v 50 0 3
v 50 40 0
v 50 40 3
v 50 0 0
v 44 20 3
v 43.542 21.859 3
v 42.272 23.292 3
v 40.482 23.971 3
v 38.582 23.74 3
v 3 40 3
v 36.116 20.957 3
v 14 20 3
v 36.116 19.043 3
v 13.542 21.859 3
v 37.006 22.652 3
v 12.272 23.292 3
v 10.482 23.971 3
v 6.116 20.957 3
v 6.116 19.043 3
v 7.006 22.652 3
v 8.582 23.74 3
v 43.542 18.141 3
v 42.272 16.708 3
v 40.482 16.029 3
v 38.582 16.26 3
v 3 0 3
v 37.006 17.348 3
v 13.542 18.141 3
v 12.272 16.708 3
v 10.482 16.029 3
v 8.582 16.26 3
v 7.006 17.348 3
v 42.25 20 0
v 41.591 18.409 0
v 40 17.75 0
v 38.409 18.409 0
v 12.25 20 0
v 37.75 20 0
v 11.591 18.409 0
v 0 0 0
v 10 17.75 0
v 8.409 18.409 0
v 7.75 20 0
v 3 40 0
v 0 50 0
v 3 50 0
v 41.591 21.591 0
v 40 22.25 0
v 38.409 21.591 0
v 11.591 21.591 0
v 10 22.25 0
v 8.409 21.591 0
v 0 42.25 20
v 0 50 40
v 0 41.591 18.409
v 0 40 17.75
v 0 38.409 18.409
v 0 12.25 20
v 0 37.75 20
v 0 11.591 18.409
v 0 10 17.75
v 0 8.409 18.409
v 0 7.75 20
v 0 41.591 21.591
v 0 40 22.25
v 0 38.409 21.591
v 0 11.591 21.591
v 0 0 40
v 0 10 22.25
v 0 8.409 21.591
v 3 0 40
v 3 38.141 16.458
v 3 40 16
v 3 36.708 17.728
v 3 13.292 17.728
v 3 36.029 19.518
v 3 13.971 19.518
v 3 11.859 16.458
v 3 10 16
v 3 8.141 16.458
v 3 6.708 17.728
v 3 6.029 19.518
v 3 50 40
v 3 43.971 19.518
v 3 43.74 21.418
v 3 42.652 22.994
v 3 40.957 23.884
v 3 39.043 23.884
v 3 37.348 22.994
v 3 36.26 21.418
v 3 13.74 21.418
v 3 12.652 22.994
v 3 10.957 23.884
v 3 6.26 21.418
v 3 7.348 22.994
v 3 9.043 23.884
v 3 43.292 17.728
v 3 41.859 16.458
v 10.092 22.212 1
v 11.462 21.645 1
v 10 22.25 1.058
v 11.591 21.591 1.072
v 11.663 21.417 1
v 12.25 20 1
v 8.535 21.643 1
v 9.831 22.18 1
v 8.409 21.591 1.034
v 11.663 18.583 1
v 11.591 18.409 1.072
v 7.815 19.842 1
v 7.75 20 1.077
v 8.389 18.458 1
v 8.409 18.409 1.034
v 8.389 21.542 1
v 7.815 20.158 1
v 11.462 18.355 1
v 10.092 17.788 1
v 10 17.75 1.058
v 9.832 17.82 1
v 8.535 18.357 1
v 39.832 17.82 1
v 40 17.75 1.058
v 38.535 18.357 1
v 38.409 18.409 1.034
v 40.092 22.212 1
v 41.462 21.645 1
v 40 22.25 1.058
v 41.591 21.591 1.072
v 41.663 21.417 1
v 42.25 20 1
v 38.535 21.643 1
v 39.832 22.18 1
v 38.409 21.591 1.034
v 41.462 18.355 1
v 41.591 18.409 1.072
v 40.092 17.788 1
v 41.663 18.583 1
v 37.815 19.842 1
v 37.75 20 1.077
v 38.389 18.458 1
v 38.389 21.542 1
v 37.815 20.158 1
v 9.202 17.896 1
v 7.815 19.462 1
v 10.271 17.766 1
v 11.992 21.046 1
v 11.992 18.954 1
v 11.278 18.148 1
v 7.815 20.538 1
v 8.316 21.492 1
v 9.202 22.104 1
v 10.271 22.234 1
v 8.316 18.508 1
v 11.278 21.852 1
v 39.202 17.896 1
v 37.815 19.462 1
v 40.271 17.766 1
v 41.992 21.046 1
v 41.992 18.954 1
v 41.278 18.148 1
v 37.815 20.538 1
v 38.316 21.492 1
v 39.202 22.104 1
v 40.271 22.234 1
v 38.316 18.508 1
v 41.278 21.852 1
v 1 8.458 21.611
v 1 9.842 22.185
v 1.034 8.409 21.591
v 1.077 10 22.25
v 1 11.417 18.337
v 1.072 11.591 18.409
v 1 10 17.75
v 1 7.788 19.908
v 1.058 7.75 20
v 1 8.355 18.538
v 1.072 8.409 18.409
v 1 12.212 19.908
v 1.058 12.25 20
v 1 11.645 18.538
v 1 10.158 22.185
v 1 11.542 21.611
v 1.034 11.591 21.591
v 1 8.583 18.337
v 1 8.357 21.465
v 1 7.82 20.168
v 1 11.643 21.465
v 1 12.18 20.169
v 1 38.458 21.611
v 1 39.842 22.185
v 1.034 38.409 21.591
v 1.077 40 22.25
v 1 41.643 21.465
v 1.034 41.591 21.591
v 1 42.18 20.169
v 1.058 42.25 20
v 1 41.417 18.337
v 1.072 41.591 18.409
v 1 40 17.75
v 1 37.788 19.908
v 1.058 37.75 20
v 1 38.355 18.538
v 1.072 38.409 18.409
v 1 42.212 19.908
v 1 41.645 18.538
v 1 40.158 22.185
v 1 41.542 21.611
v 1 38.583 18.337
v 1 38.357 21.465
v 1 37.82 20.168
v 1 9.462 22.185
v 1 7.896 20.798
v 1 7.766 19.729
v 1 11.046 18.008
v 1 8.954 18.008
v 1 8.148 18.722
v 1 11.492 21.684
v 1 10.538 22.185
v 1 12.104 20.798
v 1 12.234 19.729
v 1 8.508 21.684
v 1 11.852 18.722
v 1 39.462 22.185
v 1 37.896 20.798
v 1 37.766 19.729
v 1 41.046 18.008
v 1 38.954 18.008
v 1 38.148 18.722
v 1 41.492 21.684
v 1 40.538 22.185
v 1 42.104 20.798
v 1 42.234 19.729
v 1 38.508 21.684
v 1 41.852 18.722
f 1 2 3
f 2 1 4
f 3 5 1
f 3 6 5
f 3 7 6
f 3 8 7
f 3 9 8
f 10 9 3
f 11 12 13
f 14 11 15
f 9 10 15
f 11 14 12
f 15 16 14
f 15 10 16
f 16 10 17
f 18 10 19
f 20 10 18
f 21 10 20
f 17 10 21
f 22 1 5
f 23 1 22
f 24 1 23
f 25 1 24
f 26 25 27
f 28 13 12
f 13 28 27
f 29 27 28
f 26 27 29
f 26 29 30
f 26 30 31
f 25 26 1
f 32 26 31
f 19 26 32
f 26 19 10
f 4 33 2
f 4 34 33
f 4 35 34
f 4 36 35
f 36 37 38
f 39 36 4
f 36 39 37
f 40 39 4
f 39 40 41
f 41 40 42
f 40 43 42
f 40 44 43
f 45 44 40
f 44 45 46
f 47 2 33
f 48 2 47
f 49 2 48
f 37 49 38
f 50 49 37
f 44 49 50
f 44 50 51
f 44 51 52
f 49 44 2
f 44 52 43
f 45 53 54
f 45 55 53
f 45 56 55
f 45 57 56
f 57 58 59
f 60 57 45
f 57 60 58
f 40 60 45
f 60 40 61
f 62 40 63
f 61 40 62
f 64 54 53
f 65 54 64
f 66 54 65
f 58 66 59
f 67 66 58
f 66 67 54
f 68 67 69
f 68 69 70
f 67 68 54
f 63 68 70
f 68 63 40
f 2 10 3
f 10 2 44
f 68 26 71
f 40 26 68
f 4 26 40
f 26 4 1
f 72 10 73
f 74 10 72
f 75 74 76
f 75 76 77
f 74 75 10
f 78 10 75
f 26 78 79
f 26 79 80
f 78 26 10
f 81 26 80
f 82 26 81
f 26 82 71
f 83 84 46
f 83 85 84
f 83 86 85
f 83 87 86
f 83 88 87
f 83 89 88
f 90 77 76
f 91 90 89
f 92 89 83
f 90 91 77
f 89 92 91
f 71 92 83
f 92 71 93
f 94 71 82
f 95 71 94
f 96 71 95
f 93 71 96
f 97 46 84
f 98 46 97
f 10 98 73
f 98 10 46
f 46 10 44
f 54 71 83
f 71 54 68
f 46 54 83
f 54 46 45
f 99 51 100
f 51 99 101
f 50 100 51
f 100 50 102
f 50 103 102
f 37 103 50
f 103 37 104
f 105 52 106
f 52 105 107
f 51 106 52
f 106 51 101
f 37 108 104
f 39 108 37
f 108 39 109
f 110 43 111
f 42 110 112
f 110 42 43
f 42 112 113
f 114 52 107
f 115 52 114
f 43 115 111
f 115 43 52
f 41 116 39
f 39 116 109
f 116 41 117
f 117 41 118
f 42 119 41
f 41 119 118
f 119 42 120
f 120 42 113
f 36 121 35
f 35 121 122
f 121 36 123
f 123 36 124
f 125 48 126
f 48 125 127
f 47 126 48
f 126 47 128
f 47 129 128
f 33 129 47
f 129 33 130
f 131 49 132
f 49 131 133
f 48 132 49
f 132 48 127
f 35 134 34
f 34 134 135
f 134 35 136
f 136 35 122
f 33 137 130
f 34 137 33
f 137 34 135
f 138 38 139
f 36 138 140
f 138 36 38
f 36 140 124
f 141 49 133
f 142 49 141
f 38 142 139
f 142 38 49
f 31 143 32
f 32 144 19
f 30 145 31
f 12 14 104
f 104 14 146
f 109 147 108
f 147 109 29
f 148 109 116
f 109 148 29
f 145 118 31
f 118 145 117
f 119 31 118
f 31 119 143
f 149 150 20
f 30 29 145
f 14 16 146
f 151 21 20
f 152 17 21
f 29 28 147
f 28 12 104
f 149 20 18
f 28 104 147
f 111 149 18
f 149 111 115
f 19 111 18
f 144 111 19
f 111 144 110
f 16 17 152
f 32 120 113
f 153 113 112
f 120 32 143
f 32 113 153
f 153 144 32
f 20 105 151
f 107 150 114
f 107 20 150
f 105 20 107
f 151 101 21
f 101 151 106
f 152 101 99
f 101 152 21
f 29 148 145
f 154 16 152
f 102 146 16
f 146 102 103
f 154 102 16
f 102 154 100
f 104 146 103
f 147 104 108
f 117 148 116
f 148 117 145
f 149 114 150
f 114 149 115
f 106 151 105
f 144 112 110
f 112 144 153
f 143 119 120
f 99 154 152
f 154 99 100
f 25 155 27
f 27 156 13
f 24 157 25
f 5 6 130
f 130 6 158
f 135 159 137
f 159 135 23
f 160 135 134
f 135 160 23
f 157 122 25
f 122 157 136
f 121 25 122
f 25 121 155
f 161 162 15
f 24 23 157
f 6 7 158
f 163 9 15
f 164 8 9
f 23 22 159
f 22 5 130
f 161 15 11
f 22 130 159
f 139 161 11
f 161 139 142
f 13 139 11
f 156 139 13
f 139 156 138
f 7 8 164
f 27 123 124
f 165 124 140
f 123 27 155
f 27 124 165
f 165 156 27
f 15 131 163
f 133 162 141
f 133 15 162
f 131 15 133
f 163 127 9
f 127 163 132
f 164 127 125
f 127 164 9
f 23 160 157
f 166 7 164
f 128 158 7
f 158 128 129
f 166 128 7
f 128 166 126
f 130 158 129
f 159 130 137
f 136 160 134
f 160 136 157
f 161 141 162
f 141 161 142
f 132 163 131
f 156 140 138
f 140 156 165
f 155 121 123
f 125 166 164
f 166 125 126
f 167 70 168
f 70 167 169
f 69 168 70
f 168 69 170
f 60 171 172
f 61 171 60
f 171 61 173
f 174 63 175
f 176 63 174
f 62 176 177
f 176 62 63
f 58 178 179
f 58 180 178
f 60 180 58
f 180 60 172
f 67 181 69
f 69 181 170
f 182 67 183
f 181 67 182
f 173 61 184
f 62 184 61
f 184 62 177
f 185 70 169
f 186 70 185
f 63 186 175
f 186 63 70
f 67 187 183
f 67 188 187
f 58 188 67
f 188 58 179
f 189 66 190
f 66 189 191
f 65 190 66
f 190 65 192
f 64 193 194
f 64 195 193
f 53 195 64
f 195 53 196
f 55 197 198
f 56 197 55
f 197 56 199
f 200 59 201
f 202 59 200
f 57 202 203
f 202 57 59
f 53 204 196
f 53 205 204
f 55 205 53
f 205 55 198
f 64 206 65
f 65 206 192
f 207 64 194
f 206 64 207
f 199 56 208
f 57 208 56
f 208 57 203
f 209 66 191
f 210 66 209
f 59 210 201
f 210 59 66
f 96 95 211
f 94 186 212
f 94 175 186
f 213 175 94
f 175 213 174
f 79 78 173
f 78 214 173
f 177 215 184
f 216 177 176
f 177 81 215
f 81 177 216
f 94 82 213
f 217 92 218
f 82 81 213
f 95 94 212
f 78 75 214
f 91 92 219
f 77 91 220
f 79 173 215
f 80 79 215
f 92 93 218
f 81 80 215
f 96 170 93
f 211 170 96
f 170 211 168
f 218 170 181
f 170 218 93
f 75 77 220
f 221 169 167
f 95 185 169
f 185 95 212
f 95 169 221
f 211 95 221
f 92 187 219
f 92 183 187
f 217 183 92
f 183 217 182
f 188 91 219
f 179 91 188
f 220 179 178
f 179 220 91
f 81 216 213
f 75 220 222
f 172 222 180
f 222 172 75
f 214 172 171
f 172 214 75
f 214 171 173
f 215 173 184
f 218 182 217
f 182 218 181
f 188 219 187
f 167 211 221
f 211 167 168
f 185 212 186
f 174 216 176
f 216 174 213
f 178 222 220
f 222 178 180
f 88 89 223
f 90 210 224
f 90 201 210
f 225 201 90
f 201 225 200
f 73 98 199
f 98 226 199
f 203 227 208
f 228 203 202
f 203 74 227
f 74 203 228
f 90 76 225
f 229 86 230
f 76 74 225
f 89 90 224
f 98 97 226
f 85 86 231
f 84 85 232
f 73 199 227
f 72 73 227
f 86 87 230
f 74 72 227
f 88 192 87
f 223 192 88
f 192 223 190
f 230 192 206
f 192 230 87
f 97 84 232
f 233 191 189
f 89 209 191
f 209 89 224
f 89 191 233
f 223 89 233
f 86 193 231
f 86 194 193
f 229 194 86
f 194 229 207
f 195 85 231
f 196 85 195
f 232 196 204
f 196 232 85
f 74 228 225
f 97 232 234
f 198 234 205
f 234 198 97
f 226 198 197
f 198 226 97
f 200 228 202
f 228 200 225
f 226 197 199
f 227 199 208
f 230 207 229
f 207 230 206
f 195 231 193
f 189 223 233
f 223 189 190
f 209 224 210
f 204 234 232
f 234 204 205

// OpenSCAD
// 修正版 OpenSCAD: L字金具 (水平板 XY 平面, 垂直板 YZ 平面)、内側コーナー原点
// 内側コーナーを原点 (0,0,0) に配置
// 水平板: 50 (X) × 40 (Y) × 3 (Z)
// 垂直板: 3 (X) × 50 (Y) × 40 (Z)
// 皿穴は各面に2個ずつ、合計4個 (M4, 貫通穴 Φ4.5, 皿座面 Φ8, 深さ 2)
// 皿座面は外側へ向ける
difference() {
  union() {
    // 水平板: XY 平面, 薄さ 3
    cube([50, 40, 3], center=false);

    // 垂直板: YZ 平面, 薄さ 3 (X方向に厚さ 3)
    cube([3, 50, 40], center=false);
  }

  // 水平板の皿穴2個 (Z軸方向に貫通)
  translate([10, 20, 0])
    cylinder(h=3, r=2.25, center=false); // Φ4.5 貫通穴
  translate([40, 20, 0])
    cylinder(h=3, r=2.25, center=false);

  // 皿座面は外側(上部面 z = 3) に向ける
  translate([10, 20, 1])
    cylinder(h=2, r1=2.25, r2=4, center=false); // 皿座面 Φ8 深さ 2
  translate([40, 20, 1])
    cylinder(h=2, r1=2.25, r2=4, center=false);

  // 垂直板の皿穴2個 (X軸方向に貫通)
  // 中心点: 貫通方向は X、中心は X = 0 から厚さ 3 の範囲を貫通
  translate([0, 10, 20])
    rotate([0, 90, 0])
    cylinder(h=3, r=2.25, center=false);
  translate([0, 40, 20])
    rotate([0, 90, 0])
    cylinder(h=3, r=2.25, center=false);

  // 皿座面は外側へ向ける (X方向の外側は x = 3 面)
  // bottom of countersink at x = 1, top at x = 3 (depth 2)
  translate([1, 10, 20])
    rotate([0, 90, 0])
    cylinder(h=2, r1=2.25, r2=4, center=false);
  translate([1, 40, 20])
    rotate([0, 90, 0])
    cylinder(h=2, r1=2.25, r2=4, center=false);
}
